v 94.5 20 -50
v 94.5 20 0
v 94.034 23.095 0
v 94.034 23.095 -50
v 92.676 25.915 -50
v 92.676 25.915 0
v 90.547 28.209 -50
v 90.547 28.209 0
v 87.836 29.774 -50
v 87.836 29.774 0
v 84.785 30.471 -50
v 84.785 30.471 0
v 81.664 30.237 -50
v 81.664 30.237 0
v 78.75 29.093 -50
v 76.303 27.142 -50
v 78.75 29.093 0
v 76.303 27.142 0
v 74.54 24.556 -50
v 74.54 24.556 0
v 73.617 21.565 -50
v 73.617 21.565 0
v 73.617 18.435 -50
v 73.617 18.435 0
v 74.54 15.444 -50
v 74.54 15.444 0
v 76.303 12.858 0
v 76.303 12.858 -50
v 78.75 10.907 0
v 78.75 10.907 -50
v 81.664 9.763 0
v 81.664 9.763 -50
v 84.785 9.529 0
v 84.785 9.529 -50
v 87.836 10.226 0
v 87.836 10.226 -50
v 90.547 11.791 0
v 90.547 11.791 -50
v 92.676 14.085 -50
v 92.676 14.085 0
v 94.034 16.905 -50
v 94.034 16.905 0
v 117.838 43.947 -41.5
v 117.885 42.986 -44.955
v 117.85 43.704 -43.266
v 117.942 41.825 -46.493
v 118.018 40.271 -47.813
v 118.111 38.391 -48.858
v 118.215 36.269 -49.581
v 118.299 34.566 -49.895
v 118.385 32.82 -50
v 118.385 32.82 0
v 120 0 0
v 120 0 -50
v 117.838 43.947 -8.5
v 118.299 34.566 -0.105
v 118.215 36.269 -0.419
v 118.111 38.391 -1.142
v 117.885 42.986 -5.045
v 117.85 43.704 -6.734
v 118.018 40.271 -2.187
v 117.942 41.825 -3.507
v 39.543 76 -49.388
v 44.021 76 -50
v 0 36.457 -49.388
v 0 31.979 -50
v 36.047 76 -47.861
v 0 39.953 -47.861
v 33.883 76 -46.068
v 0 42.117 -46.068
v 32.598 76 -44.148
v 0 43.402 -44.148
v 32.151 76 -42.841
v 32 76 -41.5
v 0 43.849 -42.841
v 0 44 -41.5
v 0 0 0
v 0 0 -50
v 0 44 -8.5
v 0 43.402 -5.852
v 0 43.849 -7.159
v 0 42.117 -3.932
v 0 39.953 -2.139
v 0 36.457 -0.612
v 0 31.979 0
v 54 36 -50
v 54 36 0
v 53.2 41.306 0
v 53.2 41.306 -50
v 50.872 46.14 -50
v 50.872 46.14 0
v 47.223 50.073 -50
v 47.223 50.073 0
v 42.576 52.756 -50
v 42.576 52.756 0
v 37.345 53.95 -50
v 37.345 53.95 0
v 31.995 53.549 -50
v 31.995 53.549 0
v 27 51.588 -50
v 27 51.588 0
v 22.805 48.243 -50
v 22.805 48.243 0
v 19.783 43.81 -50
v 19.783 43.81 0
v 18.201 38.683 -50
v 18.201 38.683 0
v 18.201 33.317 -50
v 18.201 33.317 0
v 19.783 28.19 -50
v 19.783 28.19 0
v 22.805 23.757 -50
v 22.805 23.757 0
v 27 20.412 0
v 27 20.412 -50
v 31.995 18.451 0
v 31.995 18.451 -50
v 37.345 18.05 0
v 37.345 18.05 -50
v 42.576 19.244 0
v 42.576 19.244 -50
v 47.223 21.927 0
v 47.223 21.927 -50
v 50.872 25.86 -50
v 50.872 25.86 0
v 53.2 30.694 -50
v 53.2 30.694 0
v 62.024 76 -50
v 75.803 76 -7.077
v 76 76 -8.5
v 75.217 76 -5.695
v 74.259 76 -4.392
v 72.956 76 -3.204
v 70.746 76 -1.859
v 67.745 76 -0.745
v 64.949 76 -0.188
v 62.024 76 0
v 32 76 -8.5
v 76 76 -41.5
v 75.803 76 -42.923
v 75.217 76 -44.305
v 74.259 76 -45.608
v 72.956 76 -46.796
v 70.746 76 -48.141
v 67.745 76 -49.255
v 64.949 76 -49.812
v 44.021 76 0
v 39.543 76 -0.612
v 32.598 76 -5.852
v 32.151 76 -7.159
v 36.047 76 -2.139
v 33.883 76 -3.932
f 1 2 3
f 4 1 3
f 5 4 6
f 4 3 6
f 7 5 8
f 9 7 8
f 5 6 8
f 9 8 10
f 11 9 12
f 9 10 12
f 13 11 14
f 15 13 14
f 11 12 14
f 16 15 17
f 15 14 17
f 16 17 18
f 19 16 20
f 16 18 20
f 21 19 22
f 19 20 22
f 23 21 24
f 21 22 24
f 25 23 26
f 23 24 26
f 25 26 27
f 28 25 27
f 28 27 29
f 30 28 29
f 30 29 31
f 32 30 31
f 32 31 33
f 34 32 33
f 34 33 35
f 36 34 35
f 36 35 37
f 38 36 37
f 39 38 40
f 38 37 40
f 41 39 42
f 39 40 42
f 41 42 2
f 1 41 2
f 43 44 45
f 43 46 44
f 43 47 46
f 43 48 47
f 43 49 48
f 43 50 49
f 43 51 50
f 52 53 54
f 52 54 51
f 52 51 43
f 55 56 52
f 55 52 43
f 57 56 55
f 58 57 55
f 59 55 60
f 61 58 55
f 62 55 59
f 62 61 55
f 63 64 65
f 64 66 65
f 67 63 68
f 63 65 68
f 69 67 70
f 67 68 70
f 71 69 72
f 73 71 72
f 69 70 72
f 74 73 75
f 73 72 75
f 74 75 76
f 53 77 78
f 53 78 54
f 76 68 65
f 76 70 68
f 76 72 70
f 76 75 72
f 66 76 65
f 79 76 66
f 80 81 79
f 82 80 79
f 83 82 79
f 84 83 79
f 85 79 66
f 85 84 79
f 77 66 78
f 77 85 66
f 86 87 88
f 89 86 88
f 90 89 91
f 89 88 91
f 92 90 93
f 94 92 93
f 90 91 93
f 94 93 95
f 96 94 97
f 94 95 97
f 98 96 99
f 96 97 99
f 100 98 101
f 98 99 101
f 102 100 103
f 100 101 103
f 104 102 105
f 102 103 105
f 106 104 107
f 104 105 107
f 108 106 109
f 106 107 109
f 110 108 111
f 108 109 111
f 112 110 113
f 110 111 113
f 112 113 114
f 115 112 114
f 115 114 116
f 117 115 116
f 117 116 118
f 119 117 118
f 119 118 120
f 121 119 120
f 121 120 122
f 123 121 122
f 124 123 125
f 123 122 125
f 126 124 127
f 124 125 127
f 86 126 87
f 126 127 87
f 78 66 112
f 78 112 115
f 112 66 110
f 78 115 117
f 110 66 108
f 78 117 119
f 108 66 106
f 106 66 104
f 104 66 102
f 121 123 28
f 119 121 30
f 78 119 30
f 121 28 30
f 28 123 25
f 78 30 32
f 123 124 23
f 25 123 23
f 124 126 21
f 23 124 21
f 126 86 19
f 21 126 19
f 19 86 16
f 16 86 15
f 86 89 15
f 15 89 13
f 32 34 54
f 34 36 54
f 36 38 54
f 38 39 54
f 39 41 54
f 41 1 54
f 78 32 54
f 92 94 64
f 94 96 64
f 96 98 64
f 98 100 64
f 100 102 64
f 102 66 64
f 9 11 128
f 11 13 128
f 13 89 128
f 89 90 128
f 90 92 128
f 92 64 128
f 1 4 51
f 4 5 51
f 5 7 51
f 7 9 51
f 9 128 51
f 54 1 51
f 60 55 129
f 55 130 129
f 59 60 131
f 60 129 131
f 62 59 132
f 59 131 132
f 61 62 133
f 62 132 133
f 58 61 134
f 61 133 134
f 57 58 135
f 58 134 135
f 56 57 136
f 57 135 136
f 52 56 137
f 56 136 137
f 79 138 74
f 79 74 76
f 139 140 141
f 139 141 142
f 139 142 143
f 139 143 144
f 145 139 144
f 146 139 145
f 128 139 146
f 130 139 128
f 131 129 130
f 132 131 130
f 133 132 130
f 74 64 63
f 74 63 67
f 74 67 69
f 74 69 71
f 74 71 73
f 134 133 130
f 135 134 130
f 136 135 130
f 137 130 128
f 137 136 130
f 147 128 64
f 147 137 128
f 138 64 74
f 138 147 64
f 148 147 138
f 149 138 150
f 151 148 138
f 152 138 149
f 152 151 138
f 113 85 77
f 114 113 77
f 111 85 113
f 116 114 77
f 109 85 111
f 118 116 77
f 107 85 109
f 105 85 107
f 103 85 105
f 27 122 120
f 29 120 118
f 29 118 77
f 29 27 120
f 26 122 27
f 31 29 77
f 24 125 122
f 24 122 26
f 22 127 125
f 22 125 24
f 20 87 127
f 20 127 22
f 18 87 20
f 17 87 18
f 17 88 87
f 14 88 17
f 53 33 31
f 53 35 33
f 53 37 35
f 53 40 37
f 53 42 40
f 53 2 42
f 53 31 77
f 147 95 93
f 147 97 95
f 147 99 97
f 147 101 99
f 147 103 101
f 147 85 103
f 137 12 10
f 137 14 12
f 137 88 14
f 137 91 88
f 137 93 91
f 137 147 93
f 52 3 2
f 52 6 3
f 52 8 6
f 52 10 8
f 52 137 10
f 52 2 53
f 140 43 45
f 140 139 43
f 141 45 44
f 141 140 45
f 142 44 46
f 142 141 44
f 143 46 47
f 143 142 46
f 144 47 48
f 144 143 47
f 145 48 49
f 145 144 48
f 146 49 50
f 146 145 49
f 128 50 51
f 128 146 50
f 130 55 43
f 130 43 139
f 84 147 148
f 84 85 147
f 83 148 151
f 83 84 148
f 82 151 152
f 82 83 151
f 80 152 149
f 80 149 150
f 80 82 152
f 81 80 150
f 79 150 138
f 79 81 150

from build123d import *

# Parameters (mm, degrees)
F0_R     = 18
F0_R_2   = 10.5
F1_DEPTH = 50
F2_R     = 8.5
F3_R     = 8.5


with BuildPart() as f1:
    # F0 (on Top) → F1 (new body)
    with BuildSketch(Plane.XY):
        Polygon((0, 44), (0, 0), (120, 0), (117.837585, 43.946831), (76, 76), (32, 76), align=None)
        with Locations((36, 36)):
            Circle(F0_R, mode=Mode.SUBTRACT)
        with Locations((84, 20)):
            Circle(F0_R_2, mode=Mode.SUBTRACT)
    extrude(amount=-F1_DEPTH)

    # F2
    f2_edges = [f1.edges().sort_by_distance(p)[0] for p in [
        (96.918792, 59.973416, 0),
        (96.918792, 59.973416, -50),
    ]]
    fillet(f2_edges, radius=F2_R)

    # F3
    f3_edges = [f1.edges().sort_by_distance(p)[0] for p in [
        (16, 60, 0),
        (16, 60, -50),
    ]]
    fillet(f3_edges, radius=F3_R)


solid = f1.part
